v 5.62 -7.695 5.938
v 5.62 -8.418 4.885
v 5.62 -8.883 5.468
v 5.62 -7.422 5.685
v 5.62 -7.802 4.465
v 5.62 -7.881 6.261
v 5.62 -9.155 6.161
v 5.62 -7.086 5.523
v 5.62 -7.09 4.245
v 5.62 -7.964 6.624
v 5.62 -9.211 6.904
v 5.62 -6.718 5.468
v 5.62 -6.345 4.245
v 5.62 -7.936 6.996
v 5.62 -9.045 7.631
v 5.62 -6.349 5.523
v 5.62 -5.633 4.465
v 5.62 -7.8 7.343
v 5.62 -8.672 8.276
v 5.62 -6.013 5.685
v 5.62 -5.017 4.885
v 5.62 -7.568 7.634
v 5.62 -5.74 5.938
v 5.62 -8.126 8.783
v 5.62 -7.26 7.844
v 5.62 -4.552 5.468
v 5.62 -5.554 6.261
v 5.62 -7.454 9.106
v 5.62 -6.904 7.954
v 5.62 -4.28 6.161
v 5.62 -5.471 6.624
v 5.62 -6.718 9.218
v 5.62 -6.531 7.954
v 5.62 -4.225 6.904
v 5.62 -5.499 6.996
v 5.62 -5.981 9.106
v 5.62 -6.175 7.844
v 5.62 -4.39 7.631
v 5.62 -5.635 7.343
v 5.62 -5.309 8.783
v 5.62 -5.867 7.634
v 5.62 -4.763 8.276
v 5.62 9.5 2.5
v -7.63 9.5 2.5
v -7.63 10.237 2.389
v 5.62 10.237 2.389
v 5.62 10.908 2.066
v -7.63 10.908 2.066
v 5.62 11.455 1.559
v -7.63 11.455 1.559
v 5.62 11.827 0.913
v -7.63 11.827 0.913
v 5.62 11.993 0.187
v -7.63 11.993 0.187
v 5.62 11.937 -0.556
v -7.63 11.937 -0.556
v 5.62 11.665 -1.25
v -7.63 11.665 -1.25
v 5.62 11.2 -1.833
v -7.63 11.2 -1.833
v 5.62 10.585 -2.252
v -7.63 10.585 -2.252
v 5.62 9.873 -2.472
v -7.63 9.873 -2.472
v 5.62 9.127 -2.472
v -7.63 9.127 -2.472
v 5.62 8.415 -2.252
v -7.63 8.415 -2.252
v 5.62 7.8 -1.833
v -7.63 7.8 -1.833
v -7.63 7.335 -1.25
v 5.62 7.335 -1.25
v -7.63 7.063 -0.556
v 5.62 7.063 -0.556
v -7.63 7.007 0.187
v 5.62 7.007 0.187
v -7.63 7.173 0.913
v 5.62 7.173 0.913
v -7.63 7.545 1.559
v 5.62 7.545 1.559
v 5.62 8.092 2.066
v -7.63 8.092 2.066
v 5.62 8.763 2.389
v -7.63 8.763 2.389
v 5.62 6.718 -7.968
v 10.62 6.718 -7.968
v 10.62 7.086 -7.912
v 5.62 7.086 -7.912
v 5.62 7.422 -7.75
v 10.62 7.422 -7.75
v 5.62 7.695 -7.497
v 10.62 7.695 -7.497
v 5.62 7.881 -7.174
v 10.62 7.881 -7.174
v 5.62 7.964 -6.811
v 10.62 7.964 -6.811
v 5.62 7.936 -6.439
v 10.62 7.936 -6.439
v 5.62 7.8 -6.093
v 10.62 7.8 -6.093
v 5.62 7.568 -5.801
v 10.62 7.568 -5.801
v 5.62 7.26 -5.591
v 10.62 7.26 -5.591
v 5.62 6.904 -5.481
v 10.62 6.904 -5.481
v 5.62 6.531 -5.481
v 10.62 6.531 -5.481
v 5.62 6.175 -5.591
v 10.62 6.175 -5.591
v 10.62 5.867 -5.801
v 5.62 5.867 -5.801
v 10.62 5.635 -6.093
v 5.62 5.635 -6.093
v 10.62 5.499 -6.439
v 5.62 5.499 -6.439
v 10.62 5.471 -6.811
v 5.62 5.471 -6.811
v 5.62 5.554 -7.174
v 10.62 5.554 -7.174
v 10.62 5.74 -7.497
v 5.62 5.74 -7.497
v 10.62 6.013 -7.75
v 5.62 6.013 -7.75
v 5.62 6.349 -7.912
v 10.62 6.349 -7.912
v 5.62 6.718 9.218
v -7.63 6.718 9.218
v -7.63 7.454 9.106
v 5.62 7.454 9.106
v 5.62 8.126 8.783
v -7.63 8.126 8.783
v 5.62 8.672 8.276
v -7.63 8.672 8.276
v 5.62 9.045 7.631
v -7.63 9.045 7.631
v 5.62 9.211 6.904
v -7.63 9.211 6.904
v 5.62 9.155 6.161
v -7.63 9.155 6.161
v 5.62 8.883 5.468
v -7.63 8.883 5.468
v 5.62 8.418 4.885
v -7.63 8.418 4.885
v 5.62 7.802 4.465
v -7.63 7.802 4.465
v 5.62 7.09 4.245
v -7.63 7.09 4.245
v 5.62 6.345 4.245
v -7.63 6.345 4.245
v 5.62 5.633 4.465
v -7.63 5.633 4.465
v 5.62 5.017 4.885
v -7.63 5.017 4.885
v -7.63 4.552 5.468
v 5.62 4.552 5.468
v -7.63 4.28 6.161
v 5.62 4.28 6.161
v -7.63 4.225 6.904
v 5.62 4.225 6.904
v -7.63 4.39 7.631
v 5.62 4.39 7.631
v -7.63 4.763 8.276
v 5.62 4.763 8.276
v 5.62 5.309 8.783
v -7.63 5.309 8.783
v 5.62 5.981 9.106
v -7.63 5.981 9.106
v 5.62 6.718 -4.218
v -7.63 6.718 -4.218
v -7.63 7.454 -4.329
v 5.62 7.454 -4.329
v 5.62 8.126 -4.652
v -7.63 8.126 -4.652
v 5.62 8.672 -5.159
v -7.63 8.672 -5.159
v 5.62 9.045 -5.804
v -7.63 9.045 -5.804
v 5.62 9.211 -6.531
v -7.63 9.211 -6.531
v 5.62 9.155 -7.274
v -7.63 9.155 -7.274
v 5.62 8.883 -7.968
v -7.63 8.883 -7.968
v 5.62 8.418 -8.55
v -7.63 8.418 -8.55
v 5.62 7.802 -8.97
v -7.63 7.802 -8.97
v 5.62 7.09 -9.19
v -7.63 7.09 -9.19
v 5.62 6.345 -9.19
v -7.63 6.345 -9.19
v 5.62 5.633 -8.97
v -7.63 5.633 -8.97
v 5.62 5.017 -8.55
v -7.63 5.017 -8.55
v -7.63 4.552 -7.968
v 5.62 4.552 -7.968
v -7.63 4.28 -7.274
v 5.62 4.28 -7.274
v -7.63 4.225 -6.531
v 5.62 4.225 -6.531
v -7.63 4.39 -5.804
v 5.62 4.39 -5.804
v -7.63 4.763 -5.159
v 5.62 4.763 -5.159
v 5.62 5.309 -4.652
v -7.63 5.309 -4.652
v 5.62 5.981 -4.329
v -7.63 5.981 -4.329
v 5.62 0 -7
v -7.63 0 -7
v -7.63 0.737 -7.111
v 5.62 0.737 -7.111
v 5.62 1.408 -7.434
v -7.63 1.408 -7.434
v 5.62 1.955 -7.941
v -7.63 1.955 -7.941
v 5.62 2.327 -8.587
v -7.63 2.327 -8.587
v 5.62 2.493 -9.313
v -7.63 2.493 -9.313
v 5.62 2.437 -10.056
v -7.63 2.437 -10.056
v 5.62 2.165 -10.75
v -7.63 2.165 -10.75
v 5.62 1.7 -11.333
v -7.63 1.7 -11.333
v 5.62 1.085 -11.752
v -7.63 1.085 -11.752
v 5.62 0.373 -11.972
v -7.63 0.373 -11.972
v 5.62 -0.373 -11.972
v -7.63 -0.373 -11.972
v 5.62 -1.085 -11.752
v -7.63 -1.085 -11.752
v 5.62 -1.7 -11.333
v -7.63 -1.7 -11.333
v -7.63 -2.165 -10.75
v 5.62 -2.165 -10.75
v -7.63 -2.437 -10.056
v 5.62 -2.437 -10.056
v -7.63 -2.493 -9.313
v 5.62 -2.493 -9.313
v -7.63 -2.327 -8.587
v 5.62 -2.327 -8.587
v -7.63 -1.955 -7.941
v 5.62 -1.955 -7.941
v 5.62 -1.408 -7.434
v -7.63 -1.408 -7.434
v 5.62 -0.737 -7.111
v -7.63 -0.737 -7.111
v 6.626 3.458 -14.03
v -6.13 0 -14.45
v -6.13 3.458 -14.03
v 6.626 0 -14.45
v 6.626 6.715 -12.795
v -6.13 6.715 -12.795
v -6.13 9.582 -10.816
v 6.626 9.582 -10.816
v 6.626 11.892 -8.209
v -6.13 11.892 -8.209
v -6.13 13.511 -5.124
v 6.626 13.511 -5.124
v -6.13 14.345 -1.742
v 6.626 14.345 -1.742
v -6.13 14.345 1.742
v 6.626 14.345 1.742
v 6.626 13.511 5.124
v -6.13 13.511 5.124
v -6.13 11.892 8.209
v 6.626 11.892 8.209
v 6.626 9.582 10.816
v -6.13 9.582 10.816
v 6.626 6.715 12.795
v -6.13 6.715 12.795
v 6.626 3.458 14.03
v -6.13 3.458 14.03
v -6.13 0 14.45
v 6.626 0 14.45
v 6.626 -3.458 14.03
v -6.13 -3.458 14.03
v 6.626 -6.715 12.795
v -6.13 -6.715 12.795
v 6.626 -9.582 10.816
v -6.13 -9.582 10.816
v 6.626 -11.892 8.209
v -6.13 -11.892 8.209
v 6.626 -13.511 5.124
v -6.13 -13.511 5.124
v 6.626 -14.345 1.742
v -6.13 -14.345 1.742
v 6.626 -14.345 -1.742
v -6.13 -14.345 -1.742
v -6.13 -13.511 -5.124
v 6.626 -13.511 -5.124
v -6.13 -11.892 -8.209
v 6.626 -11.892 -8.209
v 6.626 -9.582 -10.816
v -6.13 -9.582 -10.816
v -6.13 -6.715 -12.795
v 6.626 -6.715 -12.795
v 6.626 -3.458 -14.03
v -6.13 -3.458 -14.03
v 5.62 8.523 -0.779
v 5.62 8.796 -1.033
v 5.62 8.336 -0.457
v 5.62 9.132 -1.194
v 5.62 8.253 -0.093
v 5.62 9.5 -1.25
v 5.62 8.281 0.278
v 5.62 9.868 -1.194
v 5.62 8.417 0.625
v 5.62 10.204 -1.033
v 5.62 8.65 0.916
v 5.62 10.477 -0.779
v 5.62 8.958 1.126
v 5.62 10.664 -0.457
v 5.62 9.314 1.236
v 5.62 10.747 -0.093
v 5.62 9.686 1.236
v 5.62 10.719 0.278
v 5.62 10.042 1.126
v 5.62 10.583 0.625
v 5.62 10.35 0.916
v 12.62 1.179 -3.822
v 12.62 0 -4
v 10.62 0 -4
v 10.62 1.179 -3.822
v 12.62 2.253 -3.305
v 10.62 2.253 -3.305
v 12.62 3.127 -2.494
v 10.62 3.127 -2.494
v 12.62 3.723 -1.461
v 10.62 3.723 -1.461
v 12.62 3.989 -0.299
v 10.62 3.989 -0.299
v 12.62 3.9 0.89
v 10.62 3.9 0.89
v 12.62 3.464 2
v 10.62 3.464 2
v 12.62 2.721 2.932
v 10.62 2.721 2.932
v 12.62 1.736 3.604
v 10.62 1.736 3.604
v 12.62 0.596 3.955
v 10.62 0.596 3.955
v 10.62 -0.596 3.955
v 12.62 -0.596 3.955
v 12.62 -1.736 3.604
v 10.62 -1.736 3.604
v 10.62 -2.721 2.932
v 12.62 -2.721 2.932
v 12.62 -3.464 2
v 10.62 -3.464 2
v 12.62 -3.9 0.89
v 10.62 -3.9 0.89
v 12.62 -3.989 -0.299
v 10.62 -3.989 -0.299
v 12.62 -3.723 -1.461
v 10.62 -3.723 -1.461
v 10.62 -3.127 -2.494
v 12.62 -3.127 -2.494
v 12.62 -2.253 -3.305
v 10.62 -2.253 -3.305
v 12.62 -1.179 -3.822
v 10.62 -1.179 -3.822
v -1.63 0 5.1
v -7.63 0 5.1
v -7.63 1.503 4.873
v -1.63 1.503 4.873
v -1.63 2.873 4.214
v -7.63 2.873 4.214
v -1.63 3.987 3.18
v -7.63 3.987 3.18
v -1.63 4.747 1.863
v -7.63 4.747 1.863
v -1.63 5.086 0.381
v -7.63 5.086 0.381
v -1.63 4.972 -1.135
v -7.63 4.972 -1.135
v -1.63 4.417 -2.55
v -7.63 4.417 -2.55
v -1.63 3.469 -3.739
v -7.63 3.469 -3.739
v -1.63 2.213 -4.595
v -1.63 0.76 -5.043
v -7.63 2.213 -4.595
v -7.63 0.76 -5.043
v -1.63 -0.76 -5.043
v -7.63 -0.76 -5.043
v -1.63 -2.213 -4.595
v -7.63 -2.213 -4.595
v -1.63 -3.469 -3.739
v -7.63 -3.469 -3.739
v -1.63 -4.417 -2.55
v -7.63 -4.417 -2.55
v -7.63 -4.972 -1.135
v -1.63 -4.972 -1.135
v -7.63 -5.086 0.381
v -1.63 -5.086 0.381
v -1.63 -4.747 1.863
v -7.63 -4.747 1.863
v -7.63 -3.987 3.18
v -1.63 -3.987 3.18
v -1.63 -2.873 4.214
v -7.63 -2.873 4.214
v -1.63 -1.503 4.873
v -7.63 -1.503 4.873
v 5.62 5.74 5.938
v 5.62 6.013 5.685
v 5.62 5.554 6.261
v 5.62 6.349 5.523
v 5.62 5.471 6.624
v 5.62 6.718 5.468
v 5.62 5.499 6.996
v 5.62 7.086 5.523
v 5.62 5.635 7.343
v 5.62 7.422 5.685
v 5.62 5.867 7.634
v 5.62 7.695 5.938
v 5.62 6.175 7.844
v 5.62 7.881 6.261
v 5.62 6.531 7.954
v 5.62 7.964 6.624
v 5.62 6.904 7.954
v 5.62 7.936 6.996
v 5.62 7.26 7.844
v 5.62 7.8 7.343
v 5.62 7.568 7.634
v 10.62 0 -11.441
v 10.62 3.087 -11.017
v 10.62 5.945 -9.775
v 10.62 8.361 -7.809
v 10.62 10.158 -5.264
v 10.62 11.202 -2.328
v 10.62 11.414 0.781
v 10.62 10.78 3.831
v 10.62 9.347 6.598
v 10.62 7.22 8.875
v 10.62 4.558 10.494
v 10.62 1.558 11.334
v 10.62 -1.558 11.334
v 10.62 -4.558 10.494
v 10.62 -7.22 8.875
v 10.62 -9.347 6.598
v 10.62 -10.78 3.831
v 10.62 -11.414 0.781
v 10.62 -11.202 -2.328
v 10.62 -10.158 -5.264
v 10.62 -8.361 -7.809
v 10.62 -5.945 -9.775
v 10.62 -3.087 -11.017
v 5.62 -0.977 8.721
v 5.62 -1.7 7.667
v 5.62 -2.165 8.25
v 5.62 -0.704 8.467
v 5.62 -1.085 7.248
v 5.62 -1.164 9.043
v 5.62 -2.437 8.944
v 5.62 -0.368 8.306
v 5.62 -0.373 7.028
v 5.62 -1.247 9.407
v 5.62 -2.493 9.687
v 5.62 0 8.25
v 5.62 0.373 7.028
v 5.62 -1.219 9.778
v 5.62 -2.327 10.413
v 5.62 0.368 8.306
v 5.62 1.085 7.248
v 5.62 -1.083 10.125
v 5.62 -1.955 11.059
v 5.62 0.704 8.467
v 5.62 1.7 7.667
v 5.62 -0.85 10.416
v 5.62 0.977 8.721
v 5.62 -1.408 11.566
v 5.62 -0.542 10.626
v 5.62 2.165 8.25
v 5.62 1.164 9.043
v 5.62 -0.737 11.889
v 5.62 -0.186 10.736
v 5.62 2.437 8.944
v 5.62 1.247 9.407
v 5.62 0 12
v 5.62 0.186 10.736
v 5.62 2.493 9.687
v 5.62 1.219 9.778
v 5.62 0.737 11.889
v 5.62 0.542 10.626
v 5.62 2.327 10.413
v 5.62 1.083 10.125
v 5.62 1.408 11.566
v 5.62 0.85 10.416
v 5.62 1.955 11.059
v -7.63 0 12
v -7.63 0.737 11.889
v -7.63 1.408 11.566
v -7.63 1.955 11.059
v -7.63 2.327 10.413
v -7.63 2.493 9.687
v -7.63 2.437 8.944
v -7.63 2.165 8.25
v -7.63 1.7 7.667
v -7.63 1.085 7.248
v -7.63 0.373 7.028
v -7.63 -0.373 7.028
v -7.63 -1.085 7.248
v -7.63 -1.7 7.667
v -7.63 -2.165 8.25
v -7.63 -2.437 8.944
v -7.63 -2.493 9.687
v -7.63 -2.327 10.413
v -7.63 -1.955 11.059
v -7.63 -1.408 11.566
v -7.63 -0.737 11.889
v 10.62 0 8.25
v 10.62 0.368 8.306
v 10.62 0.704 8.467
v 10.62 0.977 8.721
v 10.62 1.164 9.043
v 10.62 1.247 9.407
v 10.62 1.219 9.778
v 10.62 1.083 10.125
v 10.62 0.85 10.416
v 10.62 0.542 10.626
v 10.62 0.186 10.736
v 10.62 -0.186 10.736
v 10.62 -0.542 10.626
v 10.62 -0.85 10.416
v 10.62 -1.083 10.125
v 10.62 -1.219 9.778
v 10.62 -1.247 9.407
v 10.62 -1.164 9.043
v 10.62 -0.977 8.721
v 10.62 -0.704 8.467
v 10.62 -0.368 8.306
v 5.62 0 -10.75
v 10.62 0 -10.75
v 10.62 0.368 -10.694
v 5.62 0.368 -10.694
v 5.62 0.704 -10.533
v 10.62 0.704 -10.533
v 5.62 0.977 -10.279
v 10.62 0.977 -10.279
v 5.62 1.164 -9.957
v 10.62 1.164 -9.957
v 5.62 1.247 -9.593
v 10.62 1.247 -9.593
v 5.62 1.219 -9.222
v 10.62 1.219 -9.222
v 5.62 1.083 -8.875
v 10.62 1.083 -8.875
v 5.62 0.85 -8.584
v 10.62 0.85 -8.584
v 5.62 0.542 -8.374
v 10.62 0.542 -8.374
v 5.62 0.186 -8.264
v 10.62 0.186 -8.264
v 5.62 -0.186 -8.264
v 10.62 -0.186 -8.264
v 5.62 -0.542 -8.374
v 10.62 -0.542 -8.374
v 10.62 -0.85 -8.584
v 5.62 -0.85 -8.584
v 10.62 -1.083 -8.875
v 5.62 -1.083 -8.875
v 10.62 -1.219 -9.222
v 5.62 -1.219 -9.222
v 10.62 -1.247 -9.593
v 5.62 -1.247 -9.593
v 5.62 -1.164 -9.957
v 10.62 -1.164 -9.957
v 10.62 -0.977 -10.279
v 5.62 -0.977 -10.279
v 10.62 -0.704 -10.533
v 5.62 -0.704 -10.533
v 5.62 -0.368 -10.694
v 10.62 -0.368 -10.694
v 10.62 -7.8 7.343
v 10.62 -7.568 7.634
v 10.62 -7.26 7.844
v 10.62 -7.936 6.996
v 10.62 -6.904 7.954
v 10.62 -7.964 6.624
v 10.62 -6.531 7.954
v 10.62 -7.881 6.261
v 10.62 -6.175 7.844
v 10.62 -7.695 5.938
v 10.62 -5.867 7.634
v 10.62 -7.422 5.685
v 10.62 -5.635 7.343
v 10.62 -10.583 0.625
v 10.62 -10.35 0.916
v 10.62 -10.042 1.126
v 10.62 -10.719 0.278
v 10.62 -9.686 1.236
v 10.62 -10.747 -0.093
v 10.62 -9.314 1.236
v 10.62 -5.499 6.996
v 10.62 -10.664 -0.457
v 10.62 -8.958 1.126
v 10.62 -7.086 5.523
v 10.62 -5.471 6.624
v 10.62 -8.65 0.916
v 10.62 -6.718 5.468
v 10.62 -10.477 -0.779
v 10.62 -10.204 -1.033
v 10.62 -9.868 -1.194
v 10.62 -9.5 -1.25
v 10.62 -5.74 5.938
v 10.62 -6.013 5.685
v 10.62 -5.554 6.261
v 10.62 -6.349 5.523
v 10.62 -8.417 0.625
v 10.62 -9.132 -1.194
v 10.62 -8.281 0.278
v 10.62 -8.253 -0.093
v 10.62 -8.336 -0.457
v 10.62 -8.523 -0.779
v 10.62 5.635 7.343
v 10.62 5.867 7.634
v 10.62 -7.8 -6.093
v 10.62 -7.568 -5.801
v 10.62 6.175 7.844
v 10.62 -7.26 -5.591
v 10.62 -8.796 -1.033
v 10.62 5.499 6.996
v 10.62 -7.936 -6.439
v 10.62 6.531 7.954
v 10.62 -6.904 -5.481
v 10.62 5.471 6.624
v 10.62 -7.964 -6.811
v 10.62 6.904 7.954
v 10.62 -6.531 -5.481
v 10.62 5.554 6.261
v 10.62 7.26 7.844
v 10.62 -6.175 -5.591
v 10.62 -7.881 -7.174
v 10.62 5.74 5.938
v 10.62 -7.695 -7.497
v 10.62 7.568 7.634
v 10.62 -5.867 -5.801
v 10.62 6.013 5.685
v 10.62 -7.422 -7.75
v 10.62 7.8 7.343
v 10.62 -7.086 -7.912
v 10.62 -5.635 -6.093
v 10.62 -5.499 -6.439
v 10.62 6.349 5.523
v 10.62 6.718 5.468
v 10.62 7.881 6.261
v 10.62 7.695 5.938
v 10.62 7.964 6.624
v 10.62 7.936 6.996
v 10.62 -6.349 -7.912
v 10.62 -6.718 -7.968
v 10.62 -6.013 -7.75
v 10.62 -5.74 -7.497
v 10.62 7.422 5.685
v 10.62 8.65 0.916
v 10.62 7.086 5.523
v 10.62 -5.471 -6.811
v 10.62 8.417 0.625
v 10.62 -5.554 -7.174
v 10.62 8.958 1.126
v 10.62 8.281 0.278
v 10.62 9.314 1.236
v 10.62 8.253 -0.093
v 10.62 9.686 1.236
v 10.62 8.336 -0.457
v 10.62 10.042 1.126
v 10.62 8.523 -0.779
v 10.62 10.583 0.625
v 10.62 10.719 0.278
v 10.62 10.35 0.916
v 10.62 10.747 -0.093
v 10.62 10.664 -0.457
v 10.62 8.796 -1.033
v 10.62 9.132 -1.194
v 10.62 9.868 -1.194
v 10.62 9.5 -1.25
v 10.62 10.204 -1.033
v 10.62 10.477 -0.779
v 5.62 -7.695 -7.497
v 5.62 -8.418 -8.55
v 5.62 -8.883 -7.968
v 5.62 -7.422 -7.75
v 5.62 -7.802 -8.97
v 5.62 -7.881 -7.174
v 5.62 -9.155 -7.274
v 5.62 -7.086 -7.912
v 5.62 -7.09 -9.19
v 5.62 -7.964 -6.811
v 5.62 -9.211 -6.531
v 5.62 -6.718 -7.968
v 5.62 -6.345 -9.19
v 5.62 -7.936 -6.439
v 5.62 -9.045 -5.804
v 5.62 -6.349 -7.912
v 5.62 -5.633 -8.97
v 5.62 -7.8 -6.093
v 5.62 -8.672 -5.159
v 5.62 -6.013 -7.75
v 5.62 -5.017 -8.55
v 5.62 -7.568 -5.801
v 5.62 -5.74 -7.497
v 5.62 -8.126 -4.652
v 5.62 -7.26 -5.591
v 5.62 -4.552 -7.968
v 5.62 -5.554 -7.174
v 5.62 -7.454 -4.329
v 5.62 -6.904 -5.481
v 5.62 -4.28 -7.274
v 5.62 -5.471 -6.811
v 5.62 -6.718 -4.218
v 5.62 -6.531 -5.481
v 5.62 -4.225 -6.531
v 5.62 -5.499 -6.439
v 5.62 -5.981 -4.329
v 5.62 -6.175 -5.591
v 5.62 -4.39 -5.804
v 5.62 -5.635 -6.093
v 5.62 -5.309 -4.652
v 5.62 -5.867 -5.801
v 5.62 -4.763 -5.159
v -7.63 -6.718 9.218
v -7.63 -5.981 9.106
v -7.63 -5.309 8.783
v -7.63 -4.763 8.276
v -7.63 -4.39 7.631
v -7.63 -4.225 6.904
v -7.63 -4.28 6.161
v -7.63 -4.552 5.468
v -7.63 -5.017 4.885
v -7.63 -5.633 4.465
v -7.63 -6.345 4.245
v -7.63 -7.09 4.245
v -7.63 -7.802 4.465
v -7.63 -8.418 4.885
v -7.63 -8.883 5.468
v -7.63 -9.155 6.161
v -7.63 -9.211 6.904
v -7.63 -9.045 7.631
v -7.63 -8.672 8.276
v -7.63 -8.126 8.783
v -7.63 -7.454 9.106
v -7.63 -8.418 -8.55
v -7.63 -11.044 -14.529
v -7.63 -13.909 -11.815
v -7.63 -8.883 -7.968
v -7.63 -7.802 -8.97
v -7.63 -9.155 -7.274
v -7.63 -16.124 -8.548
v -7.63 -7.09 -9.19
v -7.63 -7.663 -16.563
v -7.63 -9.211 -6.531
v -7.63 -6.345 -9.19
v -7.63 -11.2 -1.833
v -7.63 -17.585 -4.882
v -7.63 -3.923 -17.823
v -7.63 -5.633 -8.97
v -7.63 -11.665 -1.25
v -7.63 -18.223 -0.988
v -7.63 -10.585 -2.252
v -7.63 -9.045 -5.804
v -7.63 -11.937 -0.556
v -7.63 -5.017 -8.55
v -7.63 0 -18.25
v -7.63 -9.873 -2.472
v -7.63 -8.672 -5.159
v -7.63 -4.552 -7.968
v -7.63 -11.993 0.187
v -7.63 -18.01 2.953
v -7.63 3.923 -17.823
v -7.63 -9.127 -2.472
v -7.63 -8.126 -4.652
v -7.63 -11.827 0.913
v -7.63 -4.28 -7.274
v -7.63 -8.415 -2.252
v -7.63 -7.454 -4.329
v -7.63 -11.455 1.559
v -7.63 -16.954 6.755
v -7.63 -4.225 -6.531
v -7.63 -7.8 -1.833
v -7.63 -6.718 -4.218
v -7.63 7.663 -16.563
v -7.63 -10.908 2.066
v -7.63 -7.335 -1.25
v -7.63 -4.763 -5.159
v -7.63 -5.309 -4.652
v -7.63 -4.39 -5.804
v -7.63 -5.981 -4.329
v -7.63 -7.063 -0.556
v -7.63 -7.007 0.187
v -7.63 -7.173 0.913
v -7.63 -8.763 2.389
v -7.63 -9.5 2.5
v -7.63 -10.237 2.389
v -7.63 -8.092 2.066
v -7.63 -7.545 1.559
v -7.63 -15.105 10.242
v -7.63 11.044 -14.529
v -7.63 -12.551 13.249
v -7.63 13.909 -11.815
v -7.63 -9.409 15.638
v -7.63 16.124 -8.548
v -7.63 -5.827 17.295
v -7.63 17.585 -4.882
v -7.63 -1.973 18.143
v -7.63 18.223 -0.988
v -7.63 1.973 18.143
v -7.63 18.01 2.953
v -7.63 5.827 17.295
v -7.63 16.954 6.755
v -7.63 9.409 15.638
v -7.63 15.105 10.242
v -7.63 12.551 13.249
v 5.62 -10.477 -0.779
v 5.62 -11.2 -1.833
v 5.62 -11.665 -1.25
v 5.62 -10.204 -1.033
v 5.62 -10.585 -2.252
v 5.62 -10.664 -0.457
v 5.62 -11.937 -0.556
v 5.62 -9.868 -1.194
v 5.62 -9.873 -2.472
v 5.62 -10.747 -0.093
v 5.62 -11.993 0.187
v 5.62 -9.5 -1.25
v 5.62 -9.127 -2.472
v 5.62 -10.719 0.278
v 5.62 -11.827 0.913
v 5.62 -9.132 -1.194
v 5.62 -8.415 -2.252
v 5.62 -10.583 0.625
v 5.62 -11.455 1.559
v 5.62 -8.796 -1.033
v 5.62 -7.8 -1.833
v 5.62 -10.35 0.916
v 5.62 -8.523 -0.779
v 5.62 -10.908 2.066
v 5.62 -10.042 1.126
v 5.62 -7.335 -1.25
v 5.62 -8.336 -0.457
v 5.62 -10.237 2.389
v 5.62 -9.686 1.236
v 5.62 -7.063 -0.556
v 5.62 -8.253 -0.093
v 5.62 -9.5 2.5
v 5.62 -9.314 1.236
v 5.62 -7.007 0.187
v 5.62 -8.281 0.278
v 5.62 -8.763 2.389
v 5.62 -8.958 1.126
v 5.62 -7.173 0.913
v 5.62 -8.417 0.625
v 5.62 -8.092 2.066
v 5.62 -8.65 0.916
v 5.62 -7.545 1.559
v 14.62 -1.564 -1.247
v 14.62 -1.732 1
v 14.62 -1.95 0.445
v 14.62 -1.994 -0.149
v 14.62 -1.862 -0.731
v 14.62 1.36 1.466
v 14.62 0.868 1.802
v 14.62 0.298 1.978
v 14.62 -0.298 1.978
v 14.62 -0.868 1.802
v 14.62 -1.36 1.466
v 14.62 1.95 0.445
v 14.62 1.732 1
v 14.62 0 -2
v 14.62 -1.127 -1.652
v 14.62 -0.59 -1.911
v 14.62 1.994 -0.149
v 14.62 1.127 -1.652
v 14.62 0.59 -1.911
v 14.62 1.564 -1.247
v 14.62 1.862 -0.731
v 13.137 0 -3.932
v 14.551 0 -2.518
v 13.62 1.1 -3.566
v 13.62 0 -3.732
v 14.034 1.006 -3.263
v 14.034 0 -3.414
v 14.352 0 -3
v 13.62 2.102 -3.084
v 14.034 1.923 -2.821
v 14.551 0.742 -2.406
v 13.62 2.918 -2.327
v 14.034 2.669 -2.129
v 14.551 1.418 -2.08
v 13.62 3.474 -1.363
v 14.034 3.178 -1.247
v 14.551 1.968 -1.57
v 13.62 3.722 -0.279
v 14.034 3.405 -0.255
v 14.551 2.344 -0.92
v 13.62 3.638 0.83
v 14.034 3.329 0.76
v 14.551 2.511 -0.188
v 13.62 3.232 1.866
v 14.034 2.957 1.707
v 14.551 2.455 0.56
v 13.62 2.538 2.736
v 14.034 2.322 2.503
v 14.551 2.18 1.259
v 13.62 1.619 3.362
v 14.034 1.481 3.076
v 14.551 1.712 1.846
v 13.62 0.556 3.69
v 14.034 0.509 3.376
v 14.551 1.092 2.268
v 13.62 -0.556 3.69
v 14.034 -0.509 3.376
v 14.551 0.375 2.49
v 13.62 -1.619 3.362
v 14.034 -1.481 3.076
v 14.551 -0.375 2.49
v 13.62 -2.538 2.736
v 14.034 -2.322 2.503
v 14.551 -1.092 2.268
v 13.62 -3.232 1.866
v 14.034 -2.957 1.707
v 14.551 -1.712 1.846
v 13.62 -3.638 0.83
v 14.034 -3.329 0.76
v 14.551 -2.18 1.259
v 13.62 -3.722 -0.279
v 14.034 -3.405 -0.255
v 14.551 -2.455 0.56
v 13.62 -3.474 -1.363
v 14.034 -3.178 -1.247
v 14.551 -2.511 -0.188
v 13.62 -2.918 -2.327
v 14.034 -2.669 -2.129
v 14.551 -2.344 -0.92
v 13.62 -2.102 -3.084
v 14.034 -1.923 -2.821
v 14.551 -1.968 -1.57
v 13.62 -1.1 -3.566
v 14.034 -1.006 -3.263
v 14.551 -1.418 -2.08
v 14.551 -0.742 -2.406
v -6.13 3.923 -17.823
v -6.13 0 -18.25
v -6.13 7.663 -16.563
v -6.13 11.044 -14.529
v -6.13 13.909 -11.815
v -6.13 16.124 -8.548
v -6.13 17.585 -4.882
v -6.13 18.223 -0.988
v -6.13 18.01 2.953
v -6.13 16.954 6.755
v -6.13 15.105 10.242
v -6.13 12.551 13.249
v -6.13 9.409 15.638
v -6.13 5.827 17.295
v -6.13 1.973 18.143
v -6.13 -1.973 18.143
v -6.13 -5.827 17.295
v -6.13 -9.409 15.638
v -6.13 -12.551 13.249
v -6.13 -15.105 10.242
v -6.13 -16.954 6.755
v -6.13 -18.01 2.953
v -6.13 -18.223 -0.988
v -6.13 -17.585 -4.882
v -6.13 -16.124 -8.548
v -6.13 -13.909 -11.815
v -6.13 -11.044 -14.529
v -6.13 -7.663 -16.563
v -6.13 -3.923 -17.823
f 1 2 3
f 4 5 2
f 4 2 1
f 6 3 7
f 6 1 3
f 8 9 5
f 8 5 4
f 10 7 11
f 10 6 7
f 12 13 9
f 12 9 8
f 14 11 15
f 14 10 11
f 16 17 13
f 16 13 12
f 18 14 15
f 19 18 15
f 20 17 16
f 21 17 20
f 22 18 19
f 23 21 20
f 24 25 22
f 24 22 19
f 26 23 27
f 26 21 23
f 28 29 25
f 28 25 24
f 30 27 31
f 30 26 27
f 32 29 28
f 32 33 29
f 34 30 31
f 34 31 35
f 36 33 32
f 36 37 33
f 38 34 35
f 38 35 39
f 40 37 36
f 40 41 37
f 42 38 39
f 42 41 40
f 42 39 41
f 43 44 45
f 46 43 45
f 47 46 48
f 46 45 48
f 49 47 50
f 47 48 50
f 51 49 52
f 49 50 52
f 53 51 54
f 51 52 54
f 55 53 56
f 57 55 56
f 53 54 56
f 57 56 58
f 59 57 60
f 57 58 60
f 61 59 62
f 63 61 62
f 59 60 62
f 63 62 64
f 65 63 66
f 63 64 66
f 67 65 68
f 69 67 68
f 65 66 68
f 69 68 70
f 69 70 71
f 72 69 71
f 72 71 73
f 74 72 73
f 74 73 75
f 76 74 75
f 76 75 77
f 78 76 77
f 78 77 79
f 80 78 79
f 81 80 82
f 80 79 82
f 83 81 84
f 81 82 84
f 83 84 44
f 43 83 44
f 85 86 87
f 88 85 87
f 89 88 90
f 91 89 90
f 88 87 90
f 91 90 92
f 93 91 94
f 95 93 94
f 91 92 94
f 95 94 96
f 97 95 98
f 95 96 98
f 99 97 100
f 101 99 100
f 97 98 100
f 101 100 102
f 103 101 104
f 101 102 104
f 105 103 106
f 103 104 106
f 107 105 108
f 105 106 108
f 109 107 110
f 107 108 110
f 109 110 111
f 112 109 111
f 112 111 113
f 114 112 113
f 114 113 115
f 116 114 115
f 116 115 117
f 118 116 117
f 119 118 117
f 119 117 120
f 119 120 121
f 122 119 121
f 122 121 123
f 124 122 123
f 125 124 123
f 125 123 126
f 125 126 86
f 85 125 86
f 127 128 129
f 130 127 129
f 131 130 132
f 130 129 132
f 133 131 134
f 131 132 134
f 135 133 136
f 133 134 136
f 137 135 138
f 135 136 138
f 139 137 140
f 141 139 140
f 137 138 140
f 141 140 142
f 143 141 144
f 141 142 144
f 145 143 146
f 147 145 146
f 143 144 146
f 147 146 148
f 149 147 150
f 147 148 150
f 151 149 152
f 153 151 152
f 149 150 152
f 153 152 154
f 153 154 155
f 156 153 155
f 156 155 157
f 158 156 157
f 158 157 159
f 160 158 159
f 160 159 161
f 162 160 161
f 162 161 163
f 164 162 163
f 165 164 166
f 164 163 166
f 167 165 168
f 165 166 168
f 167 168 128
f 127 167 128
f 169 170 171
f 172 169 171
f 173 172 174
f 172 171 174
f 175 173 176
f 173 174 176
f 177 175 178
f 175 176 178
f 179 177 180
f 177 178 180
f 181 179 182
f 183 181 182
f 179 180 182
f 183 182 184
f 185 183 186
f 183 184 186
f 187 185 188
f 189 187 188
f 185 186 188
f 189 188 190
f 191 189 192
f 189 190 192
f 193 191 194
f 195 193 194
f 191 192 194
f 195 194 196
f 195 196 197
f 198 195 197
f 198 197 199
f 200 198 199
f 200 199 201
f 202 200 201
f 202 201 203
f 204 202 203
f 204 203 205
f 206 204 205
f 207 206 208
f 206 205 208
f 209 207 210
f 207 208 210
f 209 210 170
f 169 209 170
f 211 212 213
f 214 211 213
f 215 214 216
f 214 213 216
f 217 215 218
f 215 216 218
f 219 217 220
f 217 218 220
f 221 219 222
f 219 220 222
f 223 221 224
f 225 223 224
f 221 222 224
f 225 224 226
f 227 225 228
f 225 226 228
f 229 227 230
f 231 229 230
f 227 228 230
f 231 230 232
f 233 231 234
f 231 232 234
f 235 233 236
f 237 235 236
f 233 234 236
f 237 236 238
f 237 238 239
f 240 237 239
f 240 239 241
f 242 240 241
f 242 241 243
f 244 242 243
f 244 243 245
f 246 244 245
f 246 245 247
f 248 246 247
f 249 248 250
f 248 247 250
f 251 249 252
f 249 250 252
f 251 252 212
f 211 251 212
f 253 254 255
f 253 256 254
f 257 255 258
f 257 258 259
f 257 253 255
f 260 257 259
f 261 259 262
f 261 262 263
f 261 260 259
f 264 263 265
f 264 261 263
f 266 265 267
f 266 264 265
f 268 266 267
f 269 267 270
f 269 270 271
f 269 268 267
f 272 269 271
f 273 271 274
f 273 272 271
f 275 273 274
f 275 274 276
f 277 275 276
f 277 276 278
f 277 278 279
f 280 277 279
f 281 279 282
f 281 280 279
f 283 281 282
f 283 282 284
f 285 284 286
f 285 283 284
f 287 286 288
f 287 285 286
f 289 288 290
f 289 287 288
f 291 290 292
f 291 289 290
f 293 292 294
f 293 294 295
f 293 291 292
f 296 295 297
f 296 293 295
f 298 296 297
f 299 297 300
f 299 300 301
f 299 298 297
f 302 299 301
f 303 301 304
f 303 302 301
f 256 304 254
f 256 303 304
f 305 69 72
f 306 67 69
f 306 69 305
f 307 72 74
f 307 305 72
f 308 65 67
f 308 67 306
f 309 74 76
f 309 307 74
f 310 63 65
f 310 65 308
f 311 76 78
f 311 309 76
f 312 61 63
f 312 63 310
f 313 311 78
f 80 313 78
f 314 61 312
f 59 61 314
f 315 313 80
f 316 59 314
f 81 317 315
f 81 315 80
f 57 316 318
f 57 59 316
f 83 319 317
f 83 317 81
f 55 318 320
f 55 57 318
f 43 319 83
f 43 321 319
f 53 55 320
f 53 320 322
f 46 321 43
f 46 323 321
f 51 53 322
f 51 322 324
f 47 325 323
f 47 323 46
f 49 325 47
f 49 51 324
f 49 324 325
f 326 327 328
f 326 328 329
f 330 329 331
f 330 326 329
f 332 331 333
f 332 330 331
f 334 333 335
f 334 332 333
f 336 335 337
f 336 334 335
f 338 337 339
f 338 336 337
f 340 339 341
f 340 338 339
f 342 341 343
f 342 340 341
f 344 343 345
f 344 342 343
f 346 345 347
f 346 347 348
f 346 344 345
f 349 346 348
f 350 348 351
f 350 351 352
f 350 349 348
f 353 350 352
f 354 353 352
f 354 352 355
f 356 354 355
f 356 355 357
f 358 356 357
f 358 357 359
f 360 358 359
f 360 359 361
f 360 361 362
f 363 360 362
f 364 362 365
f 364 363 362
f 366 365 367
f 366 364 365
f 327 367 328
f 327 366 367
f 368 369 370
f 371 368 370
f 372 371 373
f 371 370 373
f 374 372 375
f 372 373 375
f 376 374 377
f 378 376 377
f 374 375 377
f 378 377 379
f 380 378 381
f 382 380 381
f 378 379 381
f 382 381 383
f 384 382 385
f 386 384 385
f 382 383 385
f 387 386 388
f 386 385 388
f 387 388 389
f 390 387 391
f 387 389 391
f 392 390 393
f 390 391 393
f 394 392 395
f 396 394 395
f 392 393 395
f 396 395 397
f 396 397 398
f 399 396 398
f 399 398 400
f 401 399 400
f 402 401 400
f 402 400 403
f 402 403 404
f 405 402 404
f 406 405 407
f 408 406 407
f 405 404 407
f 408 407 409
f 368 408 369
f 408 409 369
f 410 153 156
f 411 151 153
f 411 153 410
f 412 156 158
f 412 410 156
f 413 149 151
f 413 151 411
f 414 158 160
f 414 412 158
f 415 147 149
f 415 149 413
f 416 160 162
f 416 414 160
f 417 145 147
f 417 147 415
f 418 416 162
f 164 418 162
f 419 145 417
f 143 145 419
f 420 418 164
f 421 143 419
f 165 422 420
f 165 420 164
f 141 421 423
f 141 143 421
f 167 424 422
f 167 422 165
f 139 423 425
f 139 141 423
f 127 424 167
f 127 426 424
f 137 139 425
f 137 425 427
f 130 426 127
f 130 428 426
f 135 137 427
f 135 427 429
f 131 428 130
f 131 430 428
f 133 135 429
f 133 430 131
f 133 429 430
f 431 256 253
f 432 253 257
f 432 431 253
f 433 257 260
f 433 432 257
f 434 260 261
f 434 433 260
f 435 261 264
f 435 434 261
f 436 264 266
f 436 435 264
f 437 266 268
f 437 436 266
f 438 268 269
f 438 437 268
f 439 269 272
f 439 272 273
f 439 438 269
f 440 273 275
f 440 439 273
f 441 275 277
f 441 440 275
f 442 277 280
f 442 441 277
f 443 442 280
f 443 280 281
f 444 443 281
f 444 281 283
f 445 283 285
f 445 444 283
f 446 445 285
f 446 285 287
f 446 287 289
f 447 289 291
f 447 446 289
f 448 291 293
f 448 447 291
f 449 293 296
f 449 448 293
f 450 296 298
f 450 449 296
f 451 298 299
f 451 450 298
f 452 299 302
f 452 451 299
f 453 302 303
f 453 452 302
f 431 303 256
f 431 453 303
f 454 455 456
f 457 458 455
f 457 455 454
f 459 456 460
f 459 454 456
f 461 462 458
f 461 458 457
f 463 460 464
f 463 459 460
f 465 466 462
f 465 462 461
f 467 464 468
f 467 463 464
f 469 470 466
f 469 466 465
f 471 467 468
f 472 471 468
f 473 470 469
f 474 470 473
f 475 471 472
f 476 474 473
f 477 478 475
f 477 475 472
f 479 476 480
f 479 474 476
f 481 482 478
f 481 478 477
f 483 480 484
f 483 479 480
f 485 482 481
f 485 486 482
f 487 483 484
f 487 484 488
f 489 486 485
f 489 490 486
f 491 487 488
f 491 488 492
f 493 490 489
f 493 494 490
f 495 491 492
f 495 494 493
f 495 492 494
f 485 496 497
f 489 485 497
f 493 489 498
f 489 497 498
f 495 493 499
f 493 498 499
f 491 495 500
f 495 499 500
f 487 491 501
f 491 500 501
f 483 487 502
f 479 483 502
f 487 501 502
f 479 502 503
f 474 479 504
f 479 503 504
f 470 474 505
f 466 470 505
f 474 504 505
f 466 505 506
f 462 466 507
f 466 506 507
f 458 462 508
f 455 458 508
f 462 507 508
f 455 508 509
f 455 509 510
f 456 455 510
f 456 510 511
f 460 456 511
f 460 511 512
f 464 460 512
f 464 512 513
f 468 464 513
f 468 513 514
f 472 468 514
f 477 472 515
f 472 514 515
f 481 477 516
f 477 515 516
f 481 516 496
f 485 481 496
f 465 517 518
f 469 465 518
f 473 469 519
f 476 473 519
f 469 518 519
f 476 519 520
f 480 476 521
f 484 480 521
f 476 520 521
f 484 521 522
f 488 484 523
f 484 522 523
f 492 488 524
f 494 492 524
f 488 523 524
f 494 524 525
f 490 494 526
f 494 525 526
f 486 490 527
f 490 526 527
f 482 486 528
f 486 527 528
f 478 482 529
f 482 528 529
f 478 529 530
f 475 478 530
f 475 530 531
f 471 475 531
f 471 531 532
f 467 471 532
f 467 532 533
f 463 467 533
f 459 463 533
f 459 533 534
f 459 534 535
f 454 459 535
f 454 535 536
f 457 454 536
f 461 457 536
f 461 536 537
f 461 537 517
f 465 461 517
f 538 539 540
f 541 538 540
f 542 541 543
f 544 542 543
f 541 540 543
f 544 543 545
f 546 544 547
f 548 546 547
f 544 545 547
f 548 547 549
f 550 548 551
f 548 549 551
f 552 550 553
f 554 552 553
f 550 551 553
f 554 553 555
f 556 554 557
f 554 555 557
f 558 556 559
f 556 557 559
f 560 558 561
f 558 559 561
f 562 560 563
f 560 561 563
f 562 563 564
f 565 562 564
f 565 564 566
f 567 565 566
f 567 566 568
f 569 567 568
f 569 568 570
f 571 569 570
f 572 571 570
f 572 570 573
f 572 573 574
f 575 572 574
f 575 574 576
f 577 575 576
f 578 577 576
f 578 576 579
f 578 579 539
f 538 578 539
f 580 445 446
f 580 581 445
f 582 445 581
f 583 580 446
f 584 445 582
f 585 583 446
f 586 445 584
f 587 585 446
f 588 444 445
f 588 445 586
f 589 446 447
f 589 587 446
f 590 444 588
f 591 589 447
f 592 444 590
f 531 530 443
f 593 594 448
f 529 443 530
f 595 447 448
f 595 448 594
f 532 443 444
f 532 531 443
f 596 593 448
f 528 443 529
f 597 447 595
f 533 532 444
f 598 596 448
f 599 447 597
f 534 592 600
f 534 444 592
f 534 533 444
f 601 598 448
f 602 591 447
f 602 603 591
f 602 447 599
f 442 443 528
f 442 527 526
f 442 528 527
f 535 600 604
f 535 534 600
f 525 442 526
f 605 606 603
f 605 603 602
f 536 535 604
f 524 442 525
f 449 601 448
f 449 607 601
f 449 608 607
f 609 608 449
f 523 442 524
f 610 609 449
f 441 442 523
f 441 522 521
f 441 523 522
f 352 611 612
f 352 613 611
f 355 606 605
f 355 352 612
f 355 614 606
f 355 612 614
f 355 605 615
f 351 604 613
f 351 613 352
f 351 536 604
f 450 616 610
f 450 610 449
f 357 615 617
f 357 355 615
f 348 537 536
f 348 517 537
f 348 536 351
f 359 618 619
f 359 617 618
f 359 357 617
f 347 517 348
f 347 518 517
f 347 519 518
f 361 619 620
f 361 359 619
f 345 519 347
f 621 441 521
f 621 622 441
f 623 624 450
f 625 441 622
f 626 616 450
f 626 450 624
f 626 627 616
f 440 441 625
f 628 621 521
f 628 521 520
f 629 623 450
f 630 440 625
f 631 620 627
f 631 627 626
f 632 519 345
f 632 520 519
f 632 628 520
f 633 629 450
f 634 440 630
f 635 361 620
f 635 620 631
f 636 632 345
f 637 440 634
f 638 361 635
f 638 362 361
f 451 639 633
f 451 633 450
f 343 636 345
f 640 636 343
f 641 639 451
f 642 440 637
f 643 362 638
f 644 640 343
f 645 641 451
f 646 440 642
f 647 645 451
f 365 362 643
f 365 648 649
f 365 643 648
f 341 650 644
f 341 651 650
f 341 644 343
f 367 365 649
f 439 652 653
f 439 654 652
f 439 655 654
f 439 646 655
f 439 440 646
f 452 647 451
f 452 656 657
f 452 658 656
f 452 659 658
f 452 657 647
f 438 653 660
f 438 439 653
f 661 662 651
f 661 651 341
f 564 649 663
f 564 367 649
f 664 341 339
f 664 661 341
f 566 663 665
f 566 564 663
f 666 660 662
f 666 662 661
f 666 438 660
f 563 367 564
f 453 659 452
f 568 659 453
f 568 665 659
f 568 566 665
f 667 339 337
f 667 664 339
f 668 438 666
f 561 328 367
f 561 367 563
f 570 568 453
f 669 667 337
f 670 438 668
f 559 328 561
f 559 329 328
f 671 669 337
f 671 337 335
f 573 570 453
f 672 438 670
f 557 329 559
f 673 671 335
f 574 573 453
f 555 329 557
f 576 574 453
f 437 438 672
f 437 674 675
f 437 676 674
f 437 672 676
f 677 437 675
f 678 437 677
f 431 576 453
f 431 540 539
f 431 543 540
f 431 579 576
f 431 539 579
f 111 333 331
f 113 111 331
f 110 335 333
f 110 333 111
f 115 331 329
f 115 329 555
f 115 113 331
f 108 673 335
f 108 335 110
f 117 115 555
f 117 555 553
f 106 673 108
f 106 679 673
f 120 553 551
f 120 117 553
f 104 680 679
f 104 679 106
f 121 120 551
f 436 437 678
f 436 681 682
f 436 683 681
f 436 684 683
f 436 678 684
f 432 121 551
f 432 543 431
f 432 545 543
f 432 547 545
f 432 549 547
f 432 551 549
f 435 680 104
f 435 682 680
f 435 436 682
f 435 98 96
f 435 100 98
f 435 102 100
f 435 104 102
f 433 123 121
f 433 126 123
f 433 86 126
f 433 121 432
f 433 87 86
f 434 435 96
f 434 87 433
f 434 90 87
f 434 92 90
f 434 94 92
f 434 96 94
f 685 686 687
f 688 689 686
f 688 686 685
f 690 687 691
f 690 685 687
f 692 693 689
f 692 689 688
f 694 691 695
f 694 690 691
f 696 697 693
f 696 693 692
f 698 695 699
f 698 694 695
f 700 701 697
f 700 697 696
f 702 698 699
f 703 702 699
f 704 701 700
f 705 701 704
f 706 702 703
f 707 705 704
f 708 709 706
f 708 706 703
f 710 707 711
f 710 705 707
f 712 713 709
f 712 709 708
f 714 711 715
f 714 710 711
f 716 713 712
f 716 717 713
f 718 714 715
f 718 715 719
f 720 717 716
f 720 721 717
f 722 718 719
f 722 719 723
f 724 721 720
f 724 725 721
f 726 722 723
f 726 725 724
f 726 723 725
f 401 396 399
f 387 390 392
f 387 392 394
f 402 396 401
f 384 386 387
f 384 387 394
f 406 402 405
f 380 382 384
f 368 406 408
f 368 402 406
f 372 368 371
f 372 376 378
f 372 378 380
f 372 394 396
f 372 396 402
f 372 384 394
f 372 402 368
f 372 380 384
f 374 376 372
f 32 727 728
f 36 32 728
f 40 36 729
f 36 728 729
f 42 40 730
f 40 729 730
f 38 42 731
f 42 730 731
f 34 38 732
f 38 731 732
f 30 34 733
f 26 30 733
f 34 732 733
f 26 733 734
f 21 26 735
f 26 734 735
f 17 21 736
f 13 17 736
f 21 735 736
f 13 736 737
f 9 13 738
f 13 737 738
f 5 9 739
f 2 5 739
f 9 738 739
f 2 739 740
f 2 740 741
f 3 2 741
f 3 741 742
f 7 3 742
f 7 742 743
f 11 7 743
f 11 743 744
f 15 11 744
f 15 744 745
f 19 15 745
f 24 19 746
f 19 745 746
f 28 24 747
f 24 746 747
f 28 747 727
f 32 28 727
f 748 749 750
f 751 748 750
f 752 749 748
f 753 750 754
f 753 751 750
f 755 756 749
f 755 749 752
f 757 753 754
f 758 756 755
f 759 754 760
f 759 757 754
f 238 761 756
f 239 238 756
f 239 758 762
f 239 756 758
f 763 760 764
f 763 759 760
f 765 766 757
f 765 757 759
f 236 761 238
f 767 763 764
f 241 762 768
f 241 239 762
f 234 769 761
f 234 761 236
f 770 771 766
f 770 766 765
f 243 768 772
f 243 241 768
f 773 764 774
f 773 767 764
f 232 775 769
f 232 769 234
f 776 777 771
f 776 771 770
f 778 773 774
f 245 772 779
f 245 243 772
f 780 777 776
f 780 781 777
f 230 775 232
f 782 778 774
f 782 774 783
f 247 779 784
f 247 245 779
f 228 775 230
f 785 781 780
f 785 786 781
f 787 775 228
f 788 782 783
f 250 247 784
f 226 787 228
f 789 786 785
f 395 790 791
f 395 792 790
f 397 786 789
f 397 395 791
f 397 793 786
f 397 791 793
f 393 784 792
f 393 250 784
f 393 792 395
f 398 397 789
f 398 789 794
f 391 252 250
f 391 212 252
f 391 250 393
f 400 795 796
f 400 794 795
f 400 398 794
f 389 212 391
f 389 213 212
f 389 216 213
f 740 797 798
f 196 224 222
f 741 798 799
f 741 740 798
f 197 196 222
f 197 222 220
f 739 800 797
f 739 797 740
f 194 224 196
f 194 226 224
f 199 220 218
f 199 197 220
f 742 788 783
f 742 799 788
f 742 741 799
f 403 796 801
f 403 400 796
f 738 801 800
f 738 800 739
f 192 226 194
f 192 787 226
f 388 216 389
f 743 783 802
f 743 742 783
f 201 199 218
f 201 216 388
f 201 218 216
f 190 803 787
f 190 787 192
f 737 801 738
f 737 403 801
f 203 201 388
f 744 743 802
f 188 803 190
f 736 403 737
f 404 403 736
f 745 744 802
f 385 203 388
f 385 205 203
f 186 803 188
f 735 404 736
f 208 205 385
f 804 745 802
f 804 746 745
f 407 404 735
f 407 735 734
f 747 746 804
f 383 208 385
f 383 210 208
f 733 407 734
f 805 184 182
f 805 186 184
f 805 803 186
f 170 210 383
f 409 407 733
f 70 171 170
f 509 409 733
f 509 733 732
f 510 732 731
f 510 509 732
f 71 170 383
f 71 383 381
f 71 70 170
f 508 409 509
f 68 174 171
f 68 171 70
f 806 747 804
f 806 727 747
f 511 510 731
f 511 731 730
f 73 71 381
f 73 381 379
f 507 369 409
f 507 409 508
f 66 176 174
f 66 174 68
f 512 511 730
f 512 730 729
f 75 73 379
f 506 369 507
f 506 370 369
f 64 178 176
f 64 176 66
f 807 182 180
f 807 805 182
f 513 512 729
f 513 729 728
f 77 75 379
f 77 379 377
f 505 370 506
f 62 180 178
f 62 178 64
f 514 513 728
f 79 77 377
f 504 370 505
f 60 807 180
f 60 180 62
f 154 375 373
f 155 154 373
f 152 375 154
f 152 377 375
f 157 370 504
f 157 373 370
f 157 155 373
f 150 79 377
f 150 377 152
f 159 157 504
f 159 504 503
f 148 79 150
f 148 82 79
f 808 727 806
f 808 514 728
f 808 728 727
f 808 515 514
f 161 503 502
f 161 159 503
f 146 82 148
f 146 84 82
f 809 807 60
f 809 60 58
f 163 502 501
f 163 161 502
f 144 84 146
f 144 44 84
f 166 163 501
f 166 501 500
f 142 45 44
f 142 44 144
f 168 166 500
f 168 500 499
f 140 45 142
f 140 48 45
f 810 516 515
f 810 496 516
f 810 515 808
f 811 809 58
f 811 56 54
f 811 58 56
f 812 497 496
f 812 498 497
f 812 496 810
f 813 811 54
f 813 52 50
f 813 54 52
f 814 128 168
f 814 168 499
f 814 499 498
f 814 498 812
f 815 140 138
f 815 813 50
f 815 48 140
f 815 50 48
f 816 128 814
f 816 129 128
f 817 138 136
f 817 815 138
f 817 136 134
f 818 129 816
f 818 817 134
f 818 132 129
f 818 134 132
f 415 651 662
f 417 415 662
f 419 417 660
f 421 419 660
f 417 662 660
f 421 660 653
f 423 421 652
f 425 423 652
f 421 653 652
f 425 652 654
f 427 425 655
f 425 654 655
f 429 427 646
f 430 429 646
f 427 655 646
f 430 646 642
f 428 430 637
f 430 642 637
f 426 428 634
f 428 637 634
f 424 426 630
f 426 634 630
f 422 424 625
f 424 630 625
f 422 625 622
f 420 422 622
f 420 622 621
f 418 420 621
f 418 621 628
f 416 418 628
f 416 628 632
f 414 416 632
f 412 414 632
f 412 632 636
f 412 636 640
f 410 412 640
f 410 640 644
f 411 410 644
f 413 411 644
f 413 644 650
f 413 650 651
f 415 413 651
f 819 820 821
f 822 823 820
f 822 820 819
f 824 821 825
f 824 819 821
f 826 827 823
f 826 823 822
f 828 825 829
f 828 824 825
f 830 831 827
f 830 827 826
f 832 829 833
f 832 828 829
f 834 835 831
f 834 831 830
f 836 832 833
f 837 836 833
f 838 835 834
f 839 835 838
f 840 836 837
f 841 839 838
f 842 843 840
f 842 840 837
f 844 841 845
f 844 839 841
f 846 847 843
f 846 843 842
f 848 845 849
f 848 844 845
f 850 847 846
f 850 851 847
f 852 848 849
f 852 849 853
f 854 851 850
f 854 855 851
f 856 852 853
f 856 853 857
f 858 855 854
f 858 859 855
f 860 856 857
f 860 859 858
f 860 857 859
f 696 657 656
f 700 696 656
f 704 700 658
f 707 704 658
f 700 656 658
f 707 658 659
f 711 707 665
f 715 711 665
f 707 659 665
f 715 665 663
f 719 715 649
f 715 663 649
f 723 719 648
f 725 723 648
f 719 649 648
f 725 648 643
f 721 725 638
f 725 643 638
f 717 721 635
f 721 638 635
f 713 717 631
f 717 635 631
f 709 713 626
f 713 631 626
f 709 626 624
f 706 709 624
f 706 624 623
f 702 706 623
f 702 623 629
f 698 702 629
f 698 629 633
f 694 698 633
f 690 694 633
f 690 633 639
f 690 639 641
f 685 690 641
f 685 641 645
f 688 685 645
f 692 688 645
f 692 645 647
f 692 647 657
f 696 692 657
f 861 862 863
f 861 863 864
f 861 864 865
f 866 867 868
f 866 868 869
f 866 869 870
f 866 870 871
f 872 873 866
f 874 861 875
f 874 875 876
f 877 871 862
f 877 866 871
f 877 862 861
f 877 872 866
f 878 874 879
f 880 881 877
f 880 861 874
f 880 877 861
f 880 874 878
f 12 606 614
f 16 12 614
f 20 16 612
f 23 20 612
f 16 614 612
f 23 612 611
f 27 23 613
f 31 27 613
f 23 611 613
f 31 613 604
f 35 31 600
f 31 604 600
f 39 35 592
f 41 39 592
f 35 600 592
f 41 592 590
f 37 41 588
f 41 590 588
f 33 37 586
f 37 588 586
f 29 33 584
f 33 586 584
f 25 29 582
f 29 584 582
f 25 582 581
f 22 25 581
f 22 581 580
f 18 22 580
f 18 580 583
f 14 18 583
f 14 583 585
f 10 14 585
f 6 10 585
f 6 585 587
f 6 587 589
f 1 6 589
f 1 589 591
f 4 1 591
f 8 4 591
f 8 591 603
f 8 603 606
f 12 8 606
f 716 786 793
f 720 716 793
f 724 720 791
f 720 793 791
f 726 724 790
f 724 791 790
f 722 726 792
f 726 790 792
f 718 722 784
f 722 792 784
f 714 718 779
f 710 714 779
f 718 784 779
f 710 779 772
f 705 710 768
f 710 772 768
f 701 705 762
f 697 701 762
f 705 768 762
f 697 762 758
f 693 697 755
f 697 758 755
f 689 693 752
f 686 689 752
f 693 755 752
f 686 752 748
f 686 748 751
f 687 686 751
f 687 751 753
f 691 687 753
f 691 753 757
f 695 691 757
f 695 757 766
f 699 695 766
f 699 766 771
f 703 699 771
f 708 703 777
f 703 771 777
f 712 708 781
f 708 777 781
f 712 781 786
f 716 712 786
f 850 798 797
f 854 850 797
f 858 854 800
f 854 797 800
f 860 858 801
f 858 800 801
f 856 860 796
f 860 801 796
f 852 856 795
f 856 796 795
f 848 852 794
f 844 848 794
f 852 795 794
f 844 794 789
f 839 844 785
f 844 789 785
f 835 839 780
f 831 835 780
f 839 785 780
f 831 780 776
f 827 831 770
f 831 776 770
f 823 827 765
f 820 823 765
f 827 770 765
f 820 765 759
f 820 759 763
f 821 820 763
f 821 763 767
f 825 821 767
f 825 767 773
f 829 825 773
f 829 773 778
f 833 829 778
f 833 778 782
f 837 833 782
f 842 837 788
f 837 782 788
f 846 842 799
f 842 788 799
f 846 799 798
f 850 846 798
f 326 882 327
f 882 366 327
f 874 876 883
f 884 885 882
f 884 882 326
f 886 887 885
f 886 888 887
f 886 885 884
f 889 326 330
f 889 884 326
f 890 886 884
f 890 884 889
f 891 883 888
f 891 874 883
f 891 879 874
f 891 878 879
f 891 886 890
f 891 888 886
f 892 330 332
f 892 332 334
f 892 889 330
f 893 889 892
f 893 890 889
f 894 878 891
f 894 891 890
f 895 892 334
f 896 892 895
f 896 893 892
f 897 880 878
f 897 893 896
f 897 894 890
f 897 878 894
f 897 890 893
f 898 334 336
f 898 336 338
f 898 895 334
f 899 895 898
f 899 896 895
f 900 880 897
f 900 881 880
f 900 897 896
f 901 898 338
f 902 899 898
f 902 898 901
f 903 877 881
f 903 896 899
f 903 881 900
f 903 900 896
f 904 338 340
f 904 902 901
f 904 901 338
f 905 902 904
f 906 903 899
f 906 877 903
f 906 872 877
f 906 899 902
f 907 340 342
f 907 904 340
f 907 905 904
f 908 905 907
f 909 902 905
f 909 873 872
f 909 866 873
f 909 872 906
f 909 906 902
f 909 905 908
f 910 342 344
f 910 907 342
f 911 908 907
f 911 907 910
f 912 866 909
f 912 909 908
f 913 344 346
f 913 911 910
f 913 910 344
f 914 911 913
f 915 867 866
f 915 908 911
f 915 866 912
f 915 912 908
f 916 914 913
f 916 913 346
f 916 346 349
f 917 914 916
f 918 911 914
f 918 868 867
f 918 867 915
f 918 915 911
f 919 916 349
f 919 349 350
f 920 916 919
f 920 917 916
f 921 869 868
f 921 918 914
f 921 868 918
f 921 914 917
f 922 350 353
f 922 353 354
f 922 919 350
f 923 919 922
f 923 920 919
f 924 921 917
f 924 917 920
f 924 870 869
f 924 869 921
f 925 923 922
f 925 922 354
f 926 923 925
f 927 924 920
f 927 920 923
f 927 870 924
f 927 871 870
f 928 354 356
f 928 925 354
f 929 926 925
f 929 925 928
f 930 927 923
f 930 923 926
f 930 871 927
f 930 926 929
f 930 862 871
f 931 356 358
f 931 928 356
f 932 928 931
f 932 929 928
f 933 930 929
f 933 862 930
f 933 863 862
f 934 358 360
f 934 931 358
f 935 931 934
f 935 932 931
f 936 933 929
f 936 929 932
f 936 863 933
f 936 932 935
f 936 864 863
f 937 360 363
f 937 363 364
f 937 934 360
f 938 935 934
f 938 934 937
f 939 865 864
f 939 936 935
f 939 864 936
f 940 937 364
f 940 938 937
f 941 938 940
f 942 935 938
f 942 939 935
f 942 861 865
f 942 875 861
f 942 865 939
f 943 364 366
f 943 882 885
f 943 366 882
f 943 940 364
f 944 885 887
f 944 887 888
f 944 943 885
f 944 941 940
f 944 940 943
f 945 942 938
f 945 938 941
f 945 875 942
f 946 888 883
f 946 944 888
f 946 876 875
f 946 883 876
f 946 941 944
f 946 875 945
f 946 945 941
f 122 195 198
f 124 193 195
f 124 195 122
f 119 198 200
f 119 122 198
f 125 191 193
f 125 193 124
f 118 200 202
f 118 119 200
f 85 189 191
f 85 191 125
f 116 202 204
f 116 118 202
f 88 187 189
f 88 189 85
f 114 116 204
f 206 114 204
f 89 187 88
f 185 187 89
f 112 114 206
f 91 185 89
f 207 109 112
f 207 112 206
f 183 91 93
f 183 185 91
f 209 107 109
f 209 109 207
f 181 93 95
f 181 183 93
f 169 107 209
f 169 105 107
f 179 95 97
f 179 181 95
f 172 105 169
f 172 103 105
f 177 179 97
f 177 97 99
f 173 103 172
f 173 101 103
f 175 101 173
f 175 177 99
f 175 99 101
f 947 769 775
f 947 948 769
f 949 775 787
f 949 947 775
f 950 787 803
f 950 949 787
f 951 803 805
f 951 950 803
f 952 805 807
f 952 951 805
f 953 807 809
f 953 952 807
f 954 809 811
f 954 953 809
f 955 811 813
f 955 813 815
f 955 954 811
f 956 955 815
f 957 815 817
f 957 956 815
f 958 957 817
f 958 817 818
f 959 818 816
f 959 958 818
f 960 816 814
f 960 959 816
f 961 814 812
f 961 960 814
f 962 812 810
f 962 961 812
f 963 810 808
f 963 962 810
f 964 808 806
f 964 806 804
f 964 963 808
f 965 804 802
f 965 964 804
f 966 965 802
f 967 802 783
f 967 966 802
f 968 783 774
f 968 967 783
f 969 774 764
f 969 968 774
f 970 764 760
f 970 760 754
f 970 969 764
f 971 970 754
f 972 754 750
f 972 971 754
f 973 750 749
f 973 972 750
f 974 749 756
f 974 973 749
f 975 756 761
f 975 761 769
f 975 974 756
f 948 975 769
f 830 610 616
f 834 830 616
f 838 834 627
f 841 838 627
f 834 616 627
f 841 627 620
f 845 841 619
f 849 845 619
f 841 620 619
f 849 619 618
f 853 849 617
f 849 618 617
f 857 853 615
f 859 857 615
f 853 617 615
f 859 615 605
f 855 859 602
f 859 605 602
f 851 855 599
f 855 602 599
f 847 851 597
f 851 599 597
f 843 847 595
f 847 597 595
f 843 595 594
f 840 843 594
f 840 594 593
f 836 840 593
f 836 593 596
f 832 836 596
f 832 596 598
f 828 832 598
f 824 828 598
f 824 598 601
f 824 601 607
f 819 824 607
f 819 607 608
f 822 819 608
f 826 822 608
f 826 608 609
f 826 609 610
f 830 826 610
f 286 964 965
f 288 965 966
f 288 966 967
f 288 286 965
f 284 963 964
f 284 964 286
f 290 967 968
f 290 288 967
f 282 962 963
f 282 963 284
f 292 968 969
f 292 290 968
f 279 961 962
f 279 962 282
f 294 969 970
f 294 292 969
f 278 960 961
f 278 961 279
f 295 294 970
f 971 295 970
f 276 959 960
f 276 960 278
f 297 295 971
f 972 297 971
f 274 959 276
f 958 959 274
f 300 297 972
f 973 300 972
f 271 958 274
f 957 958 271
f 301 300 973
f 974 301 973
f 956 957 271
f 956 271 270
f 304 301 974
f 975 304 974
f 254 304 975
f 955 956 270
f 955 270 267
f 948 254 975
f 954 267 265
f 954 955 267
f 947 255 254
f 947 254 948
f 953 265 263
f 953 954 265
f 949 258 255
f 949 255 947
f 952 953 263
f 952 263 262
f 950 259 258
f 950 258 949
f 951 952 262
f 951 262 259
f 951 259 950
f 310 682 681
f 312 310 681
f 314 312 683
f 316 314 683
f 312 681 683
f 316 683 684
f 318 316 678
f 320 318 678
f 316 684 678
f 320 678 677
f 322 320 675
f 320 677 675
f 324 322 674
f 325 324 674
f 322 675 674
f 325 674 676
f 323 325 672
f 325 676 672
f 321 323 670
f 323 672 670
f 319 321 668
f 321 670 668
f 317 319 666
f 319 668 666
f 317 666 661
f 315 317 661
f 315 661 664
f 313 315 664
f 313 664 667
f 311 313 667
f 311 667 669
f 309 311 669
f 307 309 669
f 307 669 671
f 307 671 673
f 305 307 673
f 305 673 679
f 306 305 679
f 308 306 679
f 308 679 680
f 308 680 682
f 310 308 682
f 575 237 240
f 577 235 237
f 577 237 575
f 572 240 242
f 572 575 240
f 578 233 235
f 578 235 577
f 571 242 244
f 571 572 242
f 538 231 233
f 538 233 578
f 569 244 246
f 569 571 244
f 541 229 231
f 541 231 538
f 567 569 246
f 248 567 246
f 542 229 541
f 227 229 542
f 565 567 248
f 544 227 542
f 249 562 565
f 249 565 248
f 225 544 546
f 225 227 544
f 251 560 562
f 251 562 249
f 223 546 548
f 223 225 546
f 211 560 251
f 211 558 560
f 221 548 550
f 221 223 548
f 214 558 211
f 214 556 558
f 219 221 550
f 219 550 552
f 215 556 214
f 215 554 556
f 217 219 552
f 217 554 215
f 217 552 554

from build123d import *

# Parameters (mm, degrees)
SKETCH2_R          = 1.25
CUT_EXTRUDE1_DEPTH = 19.25
FILLET1_R          = 2
SKETCH3_R          = 2.5
CUT_EXTRUDE2_DEPTH = 13.25
SKETCH4_R          = 5.1
CUT_EXTRUDE3_DEPTH = 6


with BuildPart() as part:
    # Sketch1 → Revolve1 (revolve)
    with BuildSketch(Plane(origin=(0, 0, 0), x_dir=(1, 0, 0), z_dir=(0, 1, 0))):
        Polygon((-6.130434783, 14.45), (6.626387667, 14.45), (10.619565217, 11.440924884), (10.619565217, 4), (14.619565217, 4), (14.619565217, 0), (13.372742768, 0), (-6.130434783, 0), (-7.630434783, 0), (-7.630434783, 18.25), (-6.130434783, 18.25), align=None)
    revolve(axis=Axis((-12.391304348, 0, 0), (1, 0, 0)))

    # Sketch2 → Cut-Extrude1 (cut, through all)
    with BuildSketch(Plane(origin=(10.619565217, 0, 0), x_dir=(0, 0, -1), z_dir=(1, 0, 0))):
        with Locations((0, 9.5)):
            Circle(SKETCH2_R)
        with Locations((6.717514421, 6.717514421)):
            Circle(SKETCH2_R)
        with Locations((9.5, 0)):
            Circle(SKETCH2_R)
        with Locations((6.717514421, -6.717514421)):
            Circle(SKETCH2_R)
        with Locations((0, -9.5)):
            Circle(SKETCH2_R)
        with Locations((-6.717514421, -6.717514421)):
            Circle(SKETCH2_R)
        with Locations((-9.5, 0)):
            Circle(SKETCH2_R)
        with Locations((-6.717514421, 6.717514421)):
            Circle(SKETCH2_R)
    extrude(amount=-CUT_EXTRUDE1_DEPTH, mode=Mode.SUBTRACT)

    # Fillet1
    fillet1_edges = [part.edges().sort_by_distance(p)[0] for p in [
        (14.619565217, 0, 4),
    ]]
    fillet(fillet1_edges, radius=FILLET1_R)

    # Sketch3 → Cut-Extrude2 (cut)
    with BuildSketch(Plane.ZY.offset(7.630434783)):
        with Locations((0, 9.5)):
            Circle(SKETCH3_R)
        with Locations((6.717514421, 6.717514421)):
            Circle(SKETCH3_R)
        with Locations((9.5, 0)):
            Circle(SKETCH3_R)
        with Locations((6.717514421, -6.717514421)):
            Circle(SKETCH3_R)
        with Locations((0, -9.5)):
            Circle(SKETCH3_R)
        with Locations((-6.717514421, -6.717514421)):
            Circle(SKETCH3_R)
        with Locations((-9.5, 0)):
            Circle(SKETCH3_R)
        with Locations((-6.717514421, 6.717514421)):
            Circle(SKETCH3_R)
    extrude(amount=-CUT_EXTRUDE2_DEPTH, mode=Mode.SUBTRACT)

    # Sketch4 → Cut-Extrude3 (cut)
    with BuildSketch(Plane.ZY.offset(7.630434783)):
        Circle(SKETCH4_R)
    extrude(amount=-CUT_EXTRUDE3_DEPTH, mode=Mode.SUBTRACT)


solid = part.part
